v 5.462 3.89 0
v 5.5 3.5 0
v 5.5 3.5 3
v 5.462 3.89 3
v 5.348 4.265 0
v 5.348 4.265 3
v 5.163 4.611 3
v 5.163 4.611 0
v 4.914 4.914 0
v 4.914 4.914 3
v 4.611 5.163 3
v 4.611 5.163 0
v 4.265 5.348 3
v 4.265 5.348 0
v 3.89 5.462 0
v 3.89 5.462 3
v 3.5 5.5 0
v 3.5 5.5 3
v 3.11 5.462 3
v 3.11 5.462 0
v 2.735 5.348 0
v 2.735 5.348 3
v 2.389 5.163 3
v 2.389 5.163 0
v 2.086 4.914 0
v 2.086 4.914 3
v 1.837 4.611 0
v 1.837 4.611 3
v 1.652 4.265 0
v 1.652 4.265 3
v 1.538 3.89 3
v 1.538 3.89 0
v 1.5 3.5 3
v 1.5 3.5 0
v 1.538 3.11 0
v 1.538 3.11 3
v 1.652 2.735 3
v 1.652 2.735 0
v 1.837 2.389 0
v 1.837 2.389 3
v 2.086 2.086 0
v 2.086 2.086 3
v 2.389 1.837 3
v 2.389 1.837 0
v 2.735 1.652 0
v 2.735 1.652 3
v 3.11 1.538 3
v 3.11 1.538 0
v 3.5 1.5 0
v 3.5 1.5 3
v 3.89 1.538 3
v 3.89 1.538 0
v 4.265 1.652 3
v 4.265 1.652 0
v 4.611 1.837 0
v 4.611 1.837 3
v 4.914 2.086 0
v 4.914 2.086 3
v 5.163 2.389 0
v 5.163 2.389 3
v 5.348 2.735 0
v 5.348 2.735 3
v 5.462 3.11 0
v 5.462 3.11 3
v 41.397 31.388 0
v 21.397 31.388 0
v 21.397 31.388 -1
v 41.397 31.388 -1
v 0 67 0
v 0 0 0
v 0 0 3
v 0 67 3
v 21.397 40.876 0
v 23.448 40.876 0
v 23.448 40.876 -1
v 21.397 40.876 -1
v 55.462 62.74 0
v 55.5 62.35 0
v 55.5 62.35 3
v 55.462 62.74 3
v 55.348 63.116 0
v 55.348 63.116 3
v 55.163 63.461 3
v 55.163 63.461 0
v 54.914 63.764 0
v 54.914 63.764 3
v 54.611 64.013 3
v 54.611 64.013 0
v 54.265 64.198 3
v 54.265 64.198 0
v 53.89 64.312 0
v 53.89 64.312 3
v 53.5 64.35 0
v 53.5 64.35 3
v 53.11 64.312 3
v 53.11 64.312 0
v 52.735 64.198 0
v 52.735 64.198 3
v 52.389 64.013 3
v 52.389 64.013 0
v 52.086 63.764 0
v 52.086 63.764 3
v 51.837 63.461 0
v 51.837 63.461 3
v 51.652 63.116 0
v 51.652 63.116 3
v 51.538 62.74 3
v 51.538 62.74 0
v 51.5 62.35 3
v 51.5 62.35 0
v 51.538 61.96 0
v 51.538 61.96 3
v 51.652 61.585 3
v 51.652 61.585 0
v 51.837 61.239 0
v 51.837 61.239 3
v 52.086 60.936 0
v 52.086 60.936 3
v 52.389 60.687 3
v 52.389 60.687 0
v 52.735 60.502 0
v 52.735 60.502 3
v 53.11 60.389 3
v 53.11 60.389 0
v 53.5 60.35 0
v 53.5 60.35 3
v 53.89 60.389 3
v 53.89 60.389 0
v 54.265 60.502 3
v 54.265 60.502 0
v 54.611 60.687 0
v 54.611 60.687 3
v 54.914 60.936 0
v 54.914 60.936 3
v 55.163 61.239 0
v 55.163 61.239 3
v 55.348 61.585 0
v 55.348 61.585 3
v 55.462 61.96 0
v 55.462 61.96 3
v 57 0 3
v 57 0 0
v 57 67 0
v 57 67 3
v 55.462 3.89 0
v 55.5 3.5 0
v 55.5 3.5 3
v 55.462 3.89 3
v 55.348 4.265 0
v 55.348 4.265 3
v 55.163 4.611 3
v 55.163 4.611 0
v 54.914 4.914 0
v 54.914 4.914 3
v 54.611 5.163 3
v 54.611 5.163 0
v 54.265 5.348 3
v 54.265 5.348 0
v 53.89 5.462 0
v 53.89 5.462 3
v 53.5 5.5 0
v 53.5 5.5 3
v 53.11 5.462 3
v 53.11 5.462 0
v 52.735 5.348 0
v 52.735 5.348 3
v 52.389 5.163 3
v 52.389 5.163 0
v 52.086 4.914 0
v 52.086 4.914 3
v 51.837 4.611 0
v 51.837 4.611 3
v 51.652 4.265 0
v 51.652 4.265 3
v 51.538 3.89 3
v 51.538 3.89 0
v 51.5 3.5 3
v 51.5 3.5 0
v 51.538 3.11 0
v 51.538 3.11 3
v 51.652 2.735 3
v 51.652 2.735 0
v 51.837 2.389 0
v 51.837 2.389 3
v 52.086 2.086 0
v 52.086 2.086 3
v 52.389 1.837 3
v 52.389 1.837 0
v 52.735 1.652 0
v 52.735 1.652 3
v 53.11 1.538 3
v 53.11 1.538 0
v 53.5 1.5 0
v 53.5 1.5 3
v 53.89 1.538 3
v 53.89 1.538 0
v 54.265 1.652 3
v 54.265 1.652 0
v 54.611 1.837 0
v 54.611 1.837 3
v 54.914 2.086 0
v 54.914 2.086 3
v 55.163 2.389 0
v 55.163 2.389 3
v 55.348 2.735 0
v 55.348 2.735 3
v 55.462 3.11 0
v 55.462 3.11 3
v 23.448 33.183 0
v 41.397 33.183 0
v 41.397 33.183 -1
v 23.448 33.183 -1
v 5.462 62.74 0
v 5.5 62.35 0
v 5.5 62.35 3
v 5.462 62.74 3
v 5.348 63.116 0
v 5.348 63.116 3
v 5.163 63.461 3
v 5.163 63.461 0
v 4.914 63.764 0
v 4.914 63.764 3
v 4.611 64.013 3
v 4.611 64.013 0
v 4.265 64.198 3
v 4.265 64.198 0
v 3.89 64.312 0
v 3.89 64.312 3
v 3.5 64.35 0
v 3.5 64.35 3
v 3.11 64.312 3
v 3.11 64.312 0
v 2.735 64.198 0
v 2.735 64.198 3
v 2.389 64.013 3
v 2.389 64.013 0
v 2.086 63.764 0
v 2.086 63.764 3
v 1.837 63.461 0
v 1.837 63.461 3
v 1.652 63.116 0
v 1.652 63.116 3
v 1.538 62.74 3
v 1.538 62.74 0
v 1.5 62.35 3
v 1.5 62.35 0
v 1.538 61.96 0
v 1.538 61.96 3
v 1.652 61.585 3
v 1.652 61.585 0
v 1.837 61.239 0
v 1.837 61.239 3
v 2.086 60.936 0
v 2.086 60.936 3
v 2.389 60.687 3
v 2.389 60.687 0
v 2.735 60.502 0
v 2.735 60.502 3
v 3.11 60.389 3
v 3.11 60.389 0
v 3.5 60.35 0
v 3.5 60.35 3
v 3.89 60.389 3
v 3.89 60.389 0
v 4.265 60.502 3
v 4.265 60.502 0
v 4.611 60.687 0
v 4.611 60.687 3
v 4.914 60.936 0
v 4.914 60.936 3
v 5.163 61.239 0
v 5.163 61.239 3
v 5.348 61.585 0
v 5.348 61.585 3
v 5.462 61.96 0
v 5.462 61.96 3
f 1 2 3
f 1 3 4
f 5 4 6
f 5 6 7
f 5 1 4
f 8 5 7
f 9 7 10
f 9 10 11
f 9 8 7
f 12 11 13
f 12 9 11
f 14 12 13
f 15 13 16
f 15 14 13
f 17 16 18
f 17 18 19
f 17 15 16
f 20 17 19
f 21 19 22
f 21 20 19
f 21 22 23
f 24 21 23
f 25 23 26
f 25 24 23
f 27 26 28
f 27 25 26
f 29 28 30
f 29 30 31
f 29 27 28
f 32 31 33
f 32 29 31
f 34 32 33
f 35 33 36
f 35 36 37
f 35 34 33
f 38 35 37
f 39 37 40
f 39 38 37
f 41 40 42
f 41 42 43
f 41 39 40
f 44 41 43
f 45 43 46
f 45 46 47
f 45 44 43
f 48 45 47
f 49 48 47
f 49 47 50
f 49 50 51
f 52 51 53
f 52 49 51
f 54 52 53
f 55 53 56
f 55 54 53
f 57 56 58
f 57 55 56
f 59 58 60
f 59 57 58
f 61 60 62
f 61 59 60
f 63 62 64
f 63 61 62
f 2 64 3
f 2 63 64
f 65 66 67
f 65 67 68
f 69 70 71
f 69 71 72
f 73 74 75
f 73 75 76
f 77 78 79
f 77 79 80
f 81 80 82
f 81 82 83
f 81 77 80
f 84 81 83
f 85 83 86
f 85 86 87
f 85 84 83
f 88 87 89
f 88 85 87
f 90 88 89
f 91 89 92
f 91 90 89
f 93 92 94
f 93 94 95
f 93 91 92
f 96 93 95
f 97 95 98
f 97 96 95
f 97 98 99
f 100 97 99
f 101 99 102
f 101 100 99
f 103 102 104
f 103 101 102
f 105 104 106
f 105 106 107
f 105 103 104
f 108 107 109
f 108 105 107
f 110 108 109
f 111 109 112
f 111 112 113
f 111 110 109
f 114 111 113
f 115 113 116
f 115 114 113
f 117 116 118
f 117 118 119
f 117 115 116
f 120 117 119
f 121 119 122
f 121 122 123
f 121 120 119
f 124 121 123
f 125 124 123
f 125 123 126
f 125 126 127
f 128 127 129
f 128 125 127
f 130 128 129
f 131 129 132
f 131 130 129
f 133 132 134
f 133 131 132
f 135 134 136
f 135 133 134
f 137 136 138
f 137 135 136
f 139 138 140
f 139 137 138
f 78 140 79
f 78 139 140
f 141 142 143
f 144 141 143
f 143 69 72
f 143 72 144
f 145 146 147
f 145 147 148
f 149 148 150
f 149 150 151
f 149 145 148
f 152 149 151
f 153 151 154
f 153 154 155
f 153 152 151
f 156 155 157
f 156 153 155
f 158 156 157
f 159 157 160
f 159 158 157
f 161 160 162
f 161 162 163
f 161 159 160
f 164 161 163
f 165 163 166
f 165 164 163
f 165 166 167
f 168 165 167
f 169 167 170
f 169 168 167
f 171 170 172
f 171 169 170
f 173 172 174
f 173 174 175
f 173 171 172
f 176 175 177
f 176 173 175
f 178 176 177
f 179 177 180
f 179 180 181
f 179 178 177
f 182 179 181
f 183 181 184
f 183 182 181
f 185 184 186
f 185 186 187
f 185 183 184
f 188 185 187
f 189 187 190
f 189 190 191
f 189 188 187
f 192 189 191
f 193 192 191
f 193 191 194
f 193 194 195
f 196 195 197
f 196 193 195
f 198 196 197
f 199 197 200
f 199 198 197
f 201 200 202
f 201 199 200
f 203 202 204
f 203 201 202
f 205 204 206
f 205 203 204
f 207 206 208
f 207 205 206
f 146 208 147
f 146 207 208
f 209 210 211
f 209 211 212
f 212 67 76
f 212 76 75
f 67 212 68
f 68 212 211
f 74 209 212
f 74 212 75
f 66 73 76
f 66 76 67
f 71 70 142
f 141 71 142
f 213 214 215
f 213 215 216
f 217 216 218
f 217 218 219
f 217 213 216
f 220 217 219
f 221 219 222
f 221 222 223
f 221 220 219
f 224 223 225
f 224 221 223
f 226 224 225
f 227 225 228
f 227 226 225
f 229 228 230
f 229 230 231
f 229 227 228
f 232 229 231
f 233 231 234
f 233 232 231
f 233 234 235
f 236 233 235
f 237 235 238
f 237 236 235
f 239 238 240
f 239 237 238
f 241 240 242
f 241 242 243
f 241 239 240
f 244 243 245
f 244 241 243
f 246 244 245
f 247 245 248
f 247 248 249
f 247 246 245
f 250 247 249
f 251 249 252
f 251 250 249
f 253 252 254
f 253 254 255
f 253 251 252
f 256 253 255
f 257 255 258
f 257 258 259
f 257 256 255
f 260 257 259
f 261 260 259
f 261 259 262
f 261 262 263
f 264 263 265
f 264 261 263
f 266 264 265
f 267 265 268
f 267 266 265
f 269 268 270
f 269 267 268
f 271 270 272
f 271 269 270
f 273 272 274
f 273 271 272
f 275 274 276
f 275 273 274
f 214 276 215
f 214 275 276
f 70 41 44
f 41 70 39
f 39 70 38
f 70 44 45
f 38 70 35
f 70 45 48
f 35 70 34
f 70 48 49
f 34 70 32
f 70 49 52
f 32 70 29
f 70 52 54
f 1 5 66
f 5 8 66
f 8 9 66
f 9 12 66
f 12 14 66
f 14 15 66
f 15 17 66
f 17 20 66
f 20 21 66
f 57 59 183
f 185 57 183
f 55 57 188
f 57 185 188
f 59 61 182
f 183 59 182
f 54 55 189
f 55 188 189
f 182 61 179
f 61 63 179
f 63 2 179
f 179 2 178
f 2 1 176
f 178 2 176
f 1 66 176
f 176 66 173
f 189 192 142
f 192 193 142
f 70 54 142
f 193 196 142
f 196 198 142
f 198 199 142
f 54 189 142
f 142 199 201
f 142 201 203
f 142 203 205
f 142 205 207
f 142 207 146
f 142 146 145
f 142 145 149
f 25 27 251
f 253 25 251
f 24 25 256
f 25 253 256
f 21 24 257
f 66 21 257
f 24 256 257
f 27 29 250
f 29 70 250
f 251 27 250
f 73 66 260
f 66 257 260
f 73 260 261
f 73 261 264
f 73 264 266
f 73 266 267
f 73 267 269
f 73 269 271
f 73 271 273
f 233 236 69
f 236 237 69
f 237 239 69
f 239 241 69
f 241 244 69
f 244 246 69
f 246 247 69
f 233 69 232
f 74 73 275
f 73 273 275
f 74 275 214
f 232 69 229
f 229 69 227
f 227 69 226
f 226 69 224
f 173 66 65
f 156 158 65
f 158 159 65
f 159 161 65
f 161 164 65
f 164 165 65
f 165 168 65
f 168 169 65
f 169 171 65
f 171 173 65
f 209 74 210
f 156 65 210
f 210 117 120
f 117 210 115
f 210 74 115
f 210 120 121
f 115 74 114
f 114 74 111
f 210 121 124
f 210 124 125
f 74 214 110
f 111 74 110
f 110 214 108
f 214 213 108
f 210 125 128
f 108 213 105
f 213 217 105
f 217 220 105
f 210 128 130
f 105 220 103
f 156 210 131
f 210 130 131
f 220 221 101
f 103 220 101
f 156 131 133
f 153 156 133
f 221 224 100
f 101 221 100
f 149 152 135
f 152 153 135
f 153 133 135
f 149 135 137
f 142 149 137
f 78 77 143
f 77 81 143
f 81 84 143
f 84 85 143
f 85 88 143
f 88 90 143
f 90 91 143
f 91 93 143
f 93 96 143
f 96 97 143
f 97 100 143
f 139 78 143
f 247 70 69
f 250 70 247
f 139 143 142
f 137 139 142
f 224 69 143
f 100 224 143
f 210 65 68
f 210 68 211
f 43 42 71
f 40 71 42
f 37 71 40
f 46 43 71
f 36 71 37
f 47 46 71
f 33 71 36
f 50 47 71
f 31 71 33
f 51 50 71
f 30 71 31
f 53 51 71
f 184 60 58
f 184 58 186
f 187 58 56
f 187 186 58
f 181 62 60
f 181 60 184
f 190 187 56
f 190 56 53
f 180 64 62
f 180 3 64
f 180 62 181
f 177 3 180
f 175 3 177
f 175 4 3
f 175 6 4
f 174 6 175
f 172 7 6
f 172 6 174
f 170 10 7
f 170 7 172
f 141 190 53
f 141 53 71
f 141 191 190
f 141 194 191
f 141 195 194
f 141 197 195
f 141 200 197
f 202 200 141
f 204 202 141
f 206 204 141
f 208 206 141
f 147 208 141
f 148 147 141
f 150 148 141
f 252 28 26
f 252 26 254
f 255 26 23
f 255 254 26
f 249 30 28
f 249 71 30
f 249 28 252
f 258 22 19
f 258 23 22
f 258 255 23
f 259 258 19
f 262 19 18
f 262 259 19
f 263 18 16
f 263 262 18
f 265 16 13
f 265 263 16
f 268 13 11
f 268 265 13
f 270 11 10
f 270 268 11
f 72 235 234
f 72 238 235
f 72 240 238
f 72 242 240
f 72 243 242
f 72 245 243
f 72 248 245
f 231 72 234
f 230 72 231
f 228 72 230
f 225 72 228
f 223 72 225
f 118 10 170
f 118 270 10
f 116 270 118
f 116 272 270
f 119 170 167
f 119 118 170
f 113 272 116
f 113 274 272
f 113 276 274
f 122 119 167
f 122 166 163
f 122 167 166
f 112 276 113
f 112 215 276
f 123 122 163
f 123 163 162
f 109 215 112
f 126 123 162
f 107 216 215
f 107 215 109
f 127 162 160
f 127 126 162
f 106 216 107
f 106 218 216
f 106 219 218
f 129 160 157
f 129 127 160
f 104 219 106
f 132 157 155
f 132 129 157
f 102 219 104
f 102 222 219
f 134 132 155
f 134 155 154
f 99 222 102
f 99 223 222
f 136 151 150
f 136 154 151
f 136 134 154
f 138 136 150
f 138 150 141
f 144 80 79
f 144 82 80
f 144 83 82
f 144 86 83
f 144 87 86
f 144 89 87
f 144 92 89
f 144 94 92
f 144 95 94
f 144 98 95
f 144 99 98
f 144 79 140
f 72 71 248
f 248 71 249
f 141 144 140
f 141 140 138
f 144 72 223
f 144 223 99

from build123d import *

# Parameters (mm, degrees)
SKICA1_W                = 57
SKICA1_H                = 67
SKICA1_R                = 2
P_IDAT_VYSUNUT_M1_DEPTH = 3
P_IDAT_VYSUNUT_M2_DEPTH = 1


with BuildPart() as part:
    # Skica1 → Přidat vysunutím1 (new body)
    with BuildSketch(Plane.XY):
        with Locations((28.5, 33.5)):
            Rectangle(SKICA1_W, SKICA1_H)
        with Locations((3.5, 62.35016579)):
            Circle(SKICA1_R, mode=Mode.SUBTRACT)
        with Locations((53.5, 62.35016579)):
            Circle(SKICA1_R, mode=Mode.SUBTRACT)
        with Locations((53.5, 3.5)):
            Circle(SKICA1_R, mode=Mode.SUBTRACT)
        with Locations((3.5, 3.5)):
            Circle(SKICA1_R, mode=Mode.SUBTRACT)
    extrude(amount=P_IDAT_VYSUNUT_M1_DEPTH)

    # Skica2 → Přidat vysunutím2 (add)
    with BuildSketch(Plane(origin=(0, 0, 0), x_dir=(-1, 0, 0), z_dir=(0, 0, -1))):
        Polygon((-41.396588298, 31.388427372), (-41.396588298, 33.183299167), (-23.447870349, 33.183299167), (-23.447870349, 40.87560686), (-21.396588298, 40.87560686), (-21.396588298, 31.388427372), align=None)
    extrude(amount=P_IDAT_VYSUNUT_M2_DEPTH)


solid = part.part
